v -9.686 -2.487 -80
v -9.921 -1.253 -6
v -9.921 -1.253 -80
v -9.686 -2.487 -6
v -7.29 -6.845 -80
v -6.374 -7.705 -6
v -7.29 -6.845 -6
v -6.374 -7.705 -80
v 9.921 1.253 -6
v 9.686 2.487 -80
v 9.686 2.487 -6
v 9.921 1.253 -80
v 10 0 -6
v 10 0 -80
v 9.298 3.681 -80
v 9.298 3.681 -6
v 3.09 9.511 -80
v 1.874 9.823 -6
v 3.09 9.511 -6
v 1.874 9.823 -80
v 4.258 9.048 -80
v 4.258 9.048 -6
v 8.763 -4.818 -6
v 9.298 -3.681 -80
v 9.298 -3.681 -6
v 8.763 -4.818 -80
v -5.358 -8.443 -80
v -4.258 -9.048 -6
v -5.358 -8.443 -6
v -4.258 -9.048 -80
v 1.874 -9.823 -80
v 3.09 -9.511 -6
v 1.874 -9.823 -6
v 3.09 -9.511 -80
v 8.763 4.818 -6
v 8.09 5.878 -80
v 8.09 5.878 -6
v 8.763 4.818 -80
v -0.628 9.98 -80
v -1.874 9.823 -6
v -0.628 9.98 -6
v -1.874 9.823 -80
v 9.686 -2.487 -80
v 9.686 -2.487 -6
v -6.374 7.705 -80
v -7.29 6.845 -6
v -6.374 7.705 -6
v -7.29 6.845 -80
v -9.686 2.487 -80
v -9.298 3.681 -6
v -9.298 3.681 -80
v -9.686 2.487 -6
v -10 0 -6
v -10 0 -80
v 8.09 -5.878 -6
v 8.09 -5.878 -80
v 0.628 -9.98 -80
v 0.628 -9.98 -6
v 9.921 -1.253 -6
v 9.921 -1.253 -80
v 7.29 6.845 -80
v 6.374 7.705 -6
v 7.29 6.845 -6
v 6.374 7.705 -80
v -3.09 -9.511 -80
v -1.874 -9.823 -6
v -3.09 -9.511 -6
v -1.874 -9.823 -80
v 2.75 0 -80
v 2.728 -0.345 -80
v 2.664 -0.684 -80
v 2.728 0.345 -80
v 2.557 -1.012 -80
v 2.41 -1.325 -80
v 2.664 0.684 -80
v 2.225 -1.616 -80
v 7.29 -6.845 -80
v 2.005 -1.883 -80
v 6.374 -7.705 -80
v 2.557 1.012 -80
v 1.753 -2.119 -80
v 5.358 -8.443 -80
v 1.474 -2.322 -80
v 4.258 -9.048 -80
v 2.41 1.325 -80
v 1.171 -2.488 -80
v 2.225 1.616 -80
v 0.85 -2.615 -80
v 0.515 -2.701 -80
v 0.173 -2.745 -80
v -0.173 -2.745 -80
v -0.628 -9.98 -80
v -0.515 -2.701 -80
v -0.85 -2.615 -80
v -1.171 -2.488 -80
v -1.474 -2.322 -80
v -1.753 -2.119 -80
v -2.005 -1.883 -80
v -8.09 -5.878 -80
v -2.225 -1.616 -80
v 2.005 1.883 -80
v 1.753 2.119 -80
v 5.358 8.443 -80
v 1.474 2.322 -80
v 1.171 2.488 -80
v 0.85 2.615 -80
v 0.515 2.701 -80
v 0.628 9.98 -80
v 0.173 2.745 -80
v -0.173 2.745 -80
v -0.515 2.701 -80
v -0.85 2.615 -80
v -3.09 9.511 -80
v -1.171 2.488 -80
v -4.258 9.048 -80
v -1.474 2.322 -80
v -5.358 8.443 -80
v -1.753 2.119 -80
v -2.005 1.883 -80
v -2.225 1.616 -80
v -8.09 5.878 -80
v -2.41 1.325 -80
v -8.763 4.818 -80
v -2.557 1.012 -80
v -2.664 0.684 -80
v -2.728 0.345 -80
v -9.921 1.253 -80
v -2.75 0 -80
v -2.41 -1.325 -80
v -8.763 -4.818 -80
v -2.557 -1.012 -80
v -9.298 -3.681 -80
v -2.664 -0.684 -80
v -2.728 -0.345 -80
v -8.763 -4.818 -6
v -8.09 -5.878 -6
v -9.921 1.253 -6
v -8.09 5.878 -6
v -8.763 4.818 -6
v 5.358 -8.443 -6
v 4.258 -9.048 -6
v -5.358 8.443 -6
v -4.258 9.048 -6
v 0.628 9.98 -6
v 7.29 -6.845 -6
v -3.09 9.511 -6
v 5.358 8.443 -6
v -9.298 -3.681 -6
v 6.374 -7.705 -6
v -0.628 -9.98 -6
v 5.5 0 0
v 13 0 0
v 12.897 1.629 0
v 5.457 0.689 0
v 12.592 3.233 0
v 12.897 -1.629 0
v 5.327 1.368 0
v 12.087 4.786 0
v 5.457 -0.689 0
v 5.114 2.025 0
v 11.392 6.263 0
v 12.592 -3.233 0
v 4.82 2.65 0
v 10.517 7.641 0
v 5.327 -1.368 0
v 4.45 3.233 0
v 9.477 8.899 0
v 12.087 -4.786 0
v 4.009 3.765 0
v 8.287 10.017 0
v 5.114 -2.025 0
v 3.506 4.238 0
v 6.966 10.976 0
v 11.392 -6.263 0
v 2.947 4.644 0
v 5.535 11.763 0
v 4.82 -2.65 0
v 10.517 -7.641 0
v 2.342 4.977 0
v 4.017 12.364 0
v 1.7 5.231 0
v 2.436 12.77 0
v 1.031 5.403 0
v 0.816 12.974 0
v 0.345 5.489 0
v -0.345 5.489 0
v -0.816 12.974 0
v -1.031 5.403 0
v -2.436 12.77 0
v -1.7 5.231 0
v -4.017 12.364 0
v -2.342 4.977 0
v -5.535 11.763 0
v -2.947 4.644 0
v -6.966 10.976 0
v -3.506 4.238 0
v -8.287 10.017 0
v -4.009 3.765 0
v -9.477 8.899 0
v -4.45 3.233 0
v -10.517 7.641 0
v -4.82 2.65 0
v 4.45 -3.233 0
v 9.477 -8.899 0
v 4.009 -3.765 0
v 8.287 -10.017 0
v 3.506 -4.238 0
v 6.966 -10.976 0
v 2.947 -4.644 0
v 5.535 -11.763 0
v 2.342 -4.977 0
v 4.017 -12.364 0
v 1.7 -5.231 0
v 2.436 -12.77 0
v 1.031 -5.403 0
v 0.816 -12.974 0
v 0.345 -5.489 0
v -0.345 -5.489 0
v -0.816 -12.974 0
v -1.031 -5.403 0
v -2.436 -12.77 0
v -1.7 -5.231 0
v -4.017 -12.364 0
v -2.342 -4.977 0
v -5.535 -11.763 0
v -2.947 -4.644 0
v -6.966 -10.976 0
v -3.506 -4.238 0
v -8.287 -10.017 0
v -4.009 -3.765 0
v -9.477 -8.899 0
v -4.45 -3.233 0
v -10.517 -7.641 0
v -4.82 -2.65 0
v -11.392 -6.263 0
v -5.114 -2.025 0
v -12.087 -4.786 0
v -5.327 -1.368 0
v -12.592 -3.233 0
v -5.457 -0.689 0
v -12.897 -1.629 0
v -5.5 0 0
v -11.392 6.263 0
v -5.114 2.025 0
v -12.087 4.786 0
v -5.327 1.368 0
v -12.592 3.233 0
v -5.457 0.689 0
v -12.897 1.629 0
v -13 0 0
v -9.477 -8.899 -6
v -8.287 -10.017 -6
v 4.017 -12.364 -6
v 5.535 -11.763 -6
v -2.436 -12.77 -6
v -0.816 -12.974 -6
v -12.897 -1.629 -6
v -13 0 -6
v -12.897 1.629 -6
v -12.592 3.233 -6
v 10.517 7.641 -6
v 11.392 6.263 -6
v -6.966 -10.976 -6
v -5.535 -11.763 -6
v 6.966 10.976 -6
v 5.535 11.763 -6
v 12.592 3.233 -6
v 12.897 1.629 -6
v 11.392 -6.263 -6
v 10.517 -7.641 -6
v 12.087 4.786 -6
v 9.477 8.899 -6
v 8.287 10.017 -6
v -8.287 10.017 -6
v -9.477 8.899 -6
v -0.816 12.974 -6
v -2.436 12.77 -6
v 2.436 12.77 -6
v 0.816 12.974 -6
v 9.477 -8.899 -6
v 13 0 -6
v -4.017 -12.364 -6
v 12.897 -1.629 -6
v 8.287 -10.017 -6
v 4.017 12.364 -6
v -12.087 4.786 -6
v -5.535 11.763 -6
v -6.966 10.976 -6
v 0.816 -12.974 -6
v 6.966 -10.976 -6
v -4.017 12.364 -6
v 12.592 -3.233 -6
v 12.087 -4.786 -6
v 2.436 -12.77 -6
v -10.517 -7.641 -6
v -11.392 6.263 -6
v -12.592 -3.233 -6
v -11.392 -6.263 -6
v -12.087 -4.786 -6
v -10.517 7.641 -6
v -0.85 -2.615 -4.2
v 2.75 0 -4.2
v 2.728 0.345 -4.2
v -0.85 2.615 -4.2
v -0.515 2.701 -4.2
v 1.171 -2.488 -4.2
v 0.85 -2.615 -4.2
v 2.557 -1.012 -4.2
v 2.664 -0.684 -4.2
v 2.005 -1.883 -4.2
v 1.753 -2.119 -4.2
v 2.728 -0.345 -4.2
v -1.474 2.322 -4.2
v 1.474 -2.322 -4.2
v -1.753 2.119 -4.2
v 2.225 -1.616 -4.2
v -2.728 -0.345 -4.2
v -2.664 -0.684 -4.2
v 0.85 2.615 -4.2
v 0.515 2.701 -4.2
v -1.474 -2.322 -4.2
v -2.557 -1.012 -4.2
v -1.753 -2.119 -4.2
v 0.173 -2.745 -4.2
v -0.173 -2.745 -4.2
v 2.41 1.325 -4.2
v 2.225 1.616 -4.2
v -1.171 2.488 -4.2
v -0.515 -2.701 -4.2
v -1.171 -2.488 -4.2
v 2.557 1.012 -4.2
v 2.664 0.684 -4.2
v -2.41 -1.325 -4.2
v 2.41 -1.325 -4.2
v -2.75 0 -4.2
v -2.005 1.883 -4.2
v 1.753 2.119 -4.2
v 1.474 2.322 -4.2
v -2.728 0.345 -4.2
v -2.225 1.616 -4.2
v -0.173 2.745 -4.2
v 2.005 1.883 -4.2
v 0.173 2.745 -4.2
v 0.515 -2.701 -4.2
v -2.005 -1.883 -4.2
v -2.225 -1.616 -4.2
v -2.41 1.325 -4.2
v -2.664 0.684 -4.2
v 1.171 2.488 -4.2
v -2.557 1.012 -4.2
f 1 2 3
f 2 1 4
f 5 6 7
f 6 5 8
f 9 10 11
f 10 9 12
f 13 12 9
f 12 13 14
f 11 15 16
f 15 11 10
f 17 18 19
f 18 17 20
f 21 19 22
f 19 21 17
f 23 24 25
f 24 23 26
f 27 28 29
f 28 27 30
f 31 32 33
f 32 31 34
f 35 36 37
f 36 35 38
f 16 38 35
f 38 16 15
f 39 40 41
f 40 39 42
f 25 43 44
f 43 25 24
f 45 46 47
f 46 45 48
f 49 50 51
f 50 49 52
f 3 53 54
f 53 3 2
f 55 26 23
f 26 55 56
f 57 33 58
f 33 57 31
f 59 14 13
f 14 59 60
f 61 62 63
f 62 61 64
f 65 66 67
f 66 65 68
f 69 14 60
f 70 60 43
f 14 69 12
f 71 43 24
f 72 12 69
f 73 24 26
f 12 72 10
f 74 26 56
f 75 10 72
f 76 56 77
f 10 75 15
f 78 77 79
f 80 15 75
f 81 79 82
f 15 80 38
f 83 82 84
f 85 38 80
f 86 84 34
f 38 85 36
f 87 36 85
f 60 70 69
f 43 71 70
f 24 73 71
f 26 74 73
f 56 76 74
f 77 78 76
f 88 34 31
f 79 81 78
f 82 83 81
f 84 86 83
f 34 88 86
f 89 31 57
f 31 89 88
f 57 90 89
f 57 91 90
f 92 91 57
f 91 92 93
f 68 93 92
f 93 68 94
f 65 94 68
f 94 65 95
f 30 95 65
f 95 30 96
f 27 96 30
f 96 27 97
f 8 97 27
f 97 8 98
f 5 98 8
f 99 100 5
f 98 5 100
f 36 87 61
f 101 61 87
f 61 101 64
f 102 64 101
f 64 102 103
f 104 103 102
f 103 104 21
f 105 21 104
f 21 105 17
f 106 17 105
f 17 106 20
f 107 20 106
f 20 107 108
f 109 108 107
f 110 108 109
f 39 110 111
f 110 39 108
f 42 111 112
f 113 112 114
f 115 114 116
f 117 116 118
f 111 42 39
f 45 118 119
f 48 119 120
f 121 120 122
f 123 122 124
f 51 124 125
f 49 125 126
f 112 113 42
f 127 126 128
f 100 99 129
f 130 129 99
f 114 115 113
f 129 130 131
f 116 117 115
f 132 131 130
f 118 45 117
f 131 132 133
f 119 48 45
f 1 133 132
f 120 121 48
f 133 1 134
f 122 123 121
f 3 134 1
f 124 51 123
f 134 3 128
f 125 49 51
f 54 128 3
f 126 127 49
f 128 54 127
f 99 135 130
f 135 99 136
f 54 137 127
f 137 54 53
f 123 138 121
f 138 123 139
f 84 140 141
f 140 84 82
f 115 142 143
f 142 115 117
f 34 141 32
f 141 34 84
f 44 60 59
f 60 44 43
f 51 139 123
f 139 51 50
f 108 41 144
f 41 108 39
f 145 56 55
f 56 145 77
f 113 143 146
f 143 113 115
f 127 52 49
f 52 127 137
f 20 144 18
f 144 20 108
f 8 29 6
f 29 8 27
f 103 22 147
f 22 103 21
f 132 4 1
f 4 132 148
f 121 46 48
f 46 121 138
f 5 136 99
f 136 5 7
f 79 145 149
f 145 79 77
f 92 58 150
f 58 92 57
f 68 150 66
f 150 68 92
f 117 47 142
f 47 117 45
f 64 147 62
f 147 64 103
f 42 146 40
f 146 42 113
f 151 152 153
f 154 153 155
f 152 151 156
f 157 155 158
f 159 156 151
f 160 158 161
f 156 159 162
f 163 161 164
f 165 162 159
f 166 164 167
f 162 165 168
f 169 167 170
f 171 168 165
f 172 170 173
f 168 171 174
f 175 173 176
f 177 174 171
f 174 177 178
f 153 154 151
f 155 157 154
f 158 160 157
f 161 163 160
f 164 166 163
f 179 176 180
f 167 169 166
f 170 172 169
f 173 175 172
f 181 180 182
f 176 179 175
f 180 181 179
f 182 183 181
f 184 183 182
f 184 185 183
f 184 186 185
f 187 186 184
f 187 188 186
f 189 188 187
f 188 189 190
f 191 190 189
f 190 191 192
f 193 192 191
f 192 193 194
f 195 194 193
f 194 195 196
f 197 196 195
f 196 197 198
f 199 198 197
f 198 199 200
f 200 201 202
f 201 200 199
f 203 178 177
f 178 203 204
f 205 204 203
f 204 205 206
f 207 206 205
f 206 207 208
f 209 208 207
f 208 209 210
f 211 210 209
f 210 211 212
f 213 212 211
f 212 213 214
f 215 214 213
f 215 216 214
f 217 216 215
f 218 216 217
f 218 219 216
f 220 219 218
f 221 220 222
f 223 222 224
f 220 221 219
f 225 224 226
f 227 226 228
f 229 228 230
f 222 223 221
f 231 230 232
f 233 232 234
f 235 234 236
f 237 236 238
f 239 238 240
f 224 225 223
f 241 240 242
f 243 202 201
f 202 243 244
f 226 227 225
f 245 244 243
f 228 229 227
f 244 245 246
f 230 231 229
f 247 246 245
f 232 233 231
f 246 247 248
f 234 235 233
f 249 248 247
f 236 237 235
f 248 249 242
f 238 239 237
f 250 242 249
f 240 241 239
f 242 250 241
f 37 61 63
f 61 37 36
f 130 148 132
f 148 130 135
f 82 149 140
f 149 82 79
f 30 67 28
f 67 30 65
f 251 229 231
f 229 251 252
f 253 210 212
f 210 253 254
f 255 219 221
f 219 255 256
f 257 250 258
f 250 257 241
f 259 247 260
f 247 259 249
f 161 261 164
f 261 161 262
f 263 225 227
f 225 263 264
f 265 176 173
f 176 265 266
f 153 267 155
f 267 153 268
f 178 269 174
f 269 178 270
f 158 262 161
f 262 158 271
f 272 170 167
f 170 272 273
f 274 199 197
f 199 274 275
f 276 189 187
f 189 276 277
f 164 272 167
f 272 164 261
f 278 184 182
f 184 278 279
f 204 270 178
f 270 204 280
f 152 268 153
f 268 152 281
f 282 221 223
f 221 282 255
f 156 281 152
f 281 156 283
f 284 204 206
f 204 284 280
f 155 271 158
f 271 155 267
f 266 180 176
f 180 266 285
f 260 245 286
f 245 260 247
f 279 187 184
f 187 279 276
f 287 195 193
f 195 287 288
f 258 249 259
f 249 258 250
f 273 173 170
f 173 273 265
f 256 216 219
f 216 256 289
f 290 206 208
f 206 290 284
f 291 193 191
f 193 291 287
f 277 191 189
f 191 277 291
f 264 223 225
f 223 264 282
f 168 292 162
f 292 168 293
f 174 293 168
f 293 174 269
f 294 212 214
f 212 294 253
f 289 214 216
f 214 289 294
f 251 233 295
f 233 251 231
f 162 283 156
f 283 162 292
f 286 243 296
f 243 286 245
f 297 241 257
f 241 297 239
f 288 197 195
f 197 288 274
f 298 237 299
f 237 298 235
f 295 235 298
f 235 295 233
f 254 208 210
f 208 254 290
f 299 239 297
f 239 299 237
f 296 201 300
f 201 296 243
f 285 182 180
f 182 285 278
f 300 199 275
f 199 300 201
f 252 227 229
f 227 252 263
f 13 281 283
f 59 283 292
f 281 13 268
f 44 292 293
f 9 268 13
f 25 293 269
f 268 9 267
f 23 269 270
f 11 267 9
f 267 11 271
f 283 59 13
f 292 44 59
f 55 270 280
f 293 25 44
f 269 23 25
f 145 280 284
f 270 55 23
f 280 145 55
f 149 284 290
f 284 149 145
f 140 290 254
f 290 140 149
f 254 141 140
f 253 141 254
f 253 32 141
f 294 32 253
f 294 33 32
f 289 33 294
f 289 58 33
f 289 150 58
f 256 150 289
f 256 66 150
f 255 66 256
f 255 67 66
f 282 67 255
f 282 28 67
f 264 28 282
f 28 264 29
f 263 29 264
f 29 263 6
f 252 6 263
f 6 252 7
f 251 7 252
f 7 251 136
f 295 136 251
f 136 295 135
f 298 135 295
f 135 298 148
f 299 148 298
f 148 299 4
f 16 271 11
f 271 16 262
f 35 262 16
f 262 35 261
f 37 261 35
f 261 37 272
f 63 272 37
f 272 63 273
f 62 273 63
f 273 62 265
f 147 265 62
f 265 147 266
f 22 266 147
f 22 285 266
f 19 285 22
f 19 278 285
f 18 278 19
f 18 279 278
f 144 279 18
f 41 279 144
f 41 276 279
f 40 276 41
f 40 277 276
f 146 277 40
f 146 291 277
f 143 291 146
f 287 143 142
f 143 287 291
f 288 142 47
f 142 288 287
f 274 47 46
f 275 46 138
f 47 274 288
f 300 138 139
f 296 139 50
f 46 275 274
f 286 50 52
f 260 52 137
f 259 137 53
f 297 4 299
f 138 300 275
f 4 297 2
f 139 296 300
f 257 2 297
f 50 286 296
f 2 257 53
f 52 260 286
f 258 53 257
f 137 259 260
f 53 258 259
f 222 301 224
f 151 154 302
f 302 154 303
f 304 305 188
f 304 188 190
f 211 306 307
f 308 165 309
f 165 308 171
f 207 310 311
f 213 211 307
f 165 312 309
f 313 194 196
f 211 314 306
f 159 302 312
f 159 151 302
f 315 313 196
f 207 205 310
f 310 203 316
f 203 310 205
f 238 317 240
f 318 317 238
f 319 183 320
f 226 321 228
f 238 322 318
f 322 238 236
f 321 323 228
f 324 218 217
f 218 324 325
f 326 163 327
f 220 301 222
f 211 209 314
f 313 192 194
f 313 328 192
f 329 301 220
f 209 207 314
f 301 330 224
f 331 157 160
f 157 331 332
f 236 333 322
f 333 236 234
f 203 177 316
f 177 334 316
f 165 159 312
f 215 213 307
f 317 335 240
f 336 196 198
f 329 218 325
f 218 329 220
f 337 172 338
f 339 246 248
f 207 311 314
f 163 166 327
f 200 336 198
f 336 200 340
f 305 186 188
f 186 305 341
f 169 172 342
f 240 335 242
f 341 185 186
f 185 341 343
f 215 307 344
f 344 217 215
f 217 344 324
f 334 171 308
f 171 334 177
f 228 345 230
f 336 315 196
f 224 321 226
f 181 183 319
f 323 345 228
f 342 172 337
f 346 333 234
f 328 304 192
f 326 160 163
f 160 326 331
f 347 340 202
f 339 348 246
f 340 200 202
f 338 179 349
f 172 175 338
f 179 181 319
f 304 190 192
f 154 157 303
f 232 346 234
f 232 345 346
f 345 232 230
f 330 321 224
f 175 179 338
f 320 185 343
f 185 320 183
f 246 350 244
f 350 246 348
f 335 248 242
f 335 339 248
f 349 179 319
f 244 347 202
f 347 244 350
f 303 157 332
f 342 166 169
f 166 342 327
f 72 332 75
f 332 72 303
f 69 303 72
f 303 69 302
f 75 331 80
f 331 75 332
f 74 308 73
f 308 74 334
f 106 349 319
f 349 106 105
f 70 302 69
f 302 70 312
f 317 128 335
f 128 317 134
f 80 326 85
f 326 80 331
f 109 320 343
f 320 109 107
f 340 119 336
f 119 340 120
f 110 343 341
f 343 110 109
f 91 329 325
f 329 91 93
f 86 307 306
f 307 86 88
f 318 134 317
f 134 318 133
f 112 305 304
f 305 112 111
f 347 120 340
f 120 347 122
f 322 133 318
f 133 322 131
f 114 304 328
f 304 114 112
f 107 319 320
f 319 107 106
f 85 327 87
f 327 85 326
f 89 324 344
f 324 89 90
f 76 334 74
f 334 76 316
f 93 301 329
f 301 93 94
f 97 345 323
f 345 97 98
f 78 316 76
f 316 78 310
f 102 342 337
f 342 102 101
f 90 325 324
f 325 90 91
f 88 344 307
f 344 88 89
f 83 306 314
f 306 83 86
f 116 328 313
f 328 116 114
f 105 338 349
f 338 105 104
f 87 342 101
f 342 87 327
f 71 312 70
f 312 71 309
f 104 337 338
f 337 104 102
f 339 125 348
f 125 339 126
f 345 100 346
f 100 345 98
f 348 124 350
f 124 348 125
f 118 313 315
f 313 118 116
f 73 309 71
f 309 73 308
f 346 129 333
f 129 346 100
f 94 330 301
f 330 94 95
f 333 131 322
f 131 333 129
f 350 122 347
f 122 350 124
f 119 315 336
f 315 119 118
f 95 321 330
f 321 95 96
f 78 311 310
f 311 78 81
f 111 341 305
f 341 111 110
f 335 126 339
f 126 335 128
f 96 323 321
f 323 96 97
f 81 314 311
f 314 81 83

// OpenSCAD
$fn = 50;


difference() {
	union() {
		translate(v = [0, 0, -80.0000000000]) {
			cylinder(h = 80, r = 10.0000000000);
		}
		translate(v = [0, 0, -6.0000000000]) {
			cylinder(h = 6, r = 13.0000000000);
		}
	}
	union() {
		translate(v = [0, 0, 0]) {
			rotate(a = [0, 0, 0]) {
				difference() {
					union() {
						#translate(v = [0, 0, -80.0000000000]) {
							cylinder(h = 80, r = 2.2500000000);
						}
						#translate(v = [0, 0, -4.2000000000]) {
							cylinder(h = 4.2000000000, r1 = 2.7500000000, r2 = 5.5000000000);
						}
						#translate(v = [0, 0, -80.0000000000]) {
							cylinder(h = 80, r = 2.7500000000);
						}
						#translate(v = [0, 0, -80.0000000000]) {
							cylinder(h = 80, r = 2.2500000000);
						}
					}
					union();
				}
			}
		}
	}
}
